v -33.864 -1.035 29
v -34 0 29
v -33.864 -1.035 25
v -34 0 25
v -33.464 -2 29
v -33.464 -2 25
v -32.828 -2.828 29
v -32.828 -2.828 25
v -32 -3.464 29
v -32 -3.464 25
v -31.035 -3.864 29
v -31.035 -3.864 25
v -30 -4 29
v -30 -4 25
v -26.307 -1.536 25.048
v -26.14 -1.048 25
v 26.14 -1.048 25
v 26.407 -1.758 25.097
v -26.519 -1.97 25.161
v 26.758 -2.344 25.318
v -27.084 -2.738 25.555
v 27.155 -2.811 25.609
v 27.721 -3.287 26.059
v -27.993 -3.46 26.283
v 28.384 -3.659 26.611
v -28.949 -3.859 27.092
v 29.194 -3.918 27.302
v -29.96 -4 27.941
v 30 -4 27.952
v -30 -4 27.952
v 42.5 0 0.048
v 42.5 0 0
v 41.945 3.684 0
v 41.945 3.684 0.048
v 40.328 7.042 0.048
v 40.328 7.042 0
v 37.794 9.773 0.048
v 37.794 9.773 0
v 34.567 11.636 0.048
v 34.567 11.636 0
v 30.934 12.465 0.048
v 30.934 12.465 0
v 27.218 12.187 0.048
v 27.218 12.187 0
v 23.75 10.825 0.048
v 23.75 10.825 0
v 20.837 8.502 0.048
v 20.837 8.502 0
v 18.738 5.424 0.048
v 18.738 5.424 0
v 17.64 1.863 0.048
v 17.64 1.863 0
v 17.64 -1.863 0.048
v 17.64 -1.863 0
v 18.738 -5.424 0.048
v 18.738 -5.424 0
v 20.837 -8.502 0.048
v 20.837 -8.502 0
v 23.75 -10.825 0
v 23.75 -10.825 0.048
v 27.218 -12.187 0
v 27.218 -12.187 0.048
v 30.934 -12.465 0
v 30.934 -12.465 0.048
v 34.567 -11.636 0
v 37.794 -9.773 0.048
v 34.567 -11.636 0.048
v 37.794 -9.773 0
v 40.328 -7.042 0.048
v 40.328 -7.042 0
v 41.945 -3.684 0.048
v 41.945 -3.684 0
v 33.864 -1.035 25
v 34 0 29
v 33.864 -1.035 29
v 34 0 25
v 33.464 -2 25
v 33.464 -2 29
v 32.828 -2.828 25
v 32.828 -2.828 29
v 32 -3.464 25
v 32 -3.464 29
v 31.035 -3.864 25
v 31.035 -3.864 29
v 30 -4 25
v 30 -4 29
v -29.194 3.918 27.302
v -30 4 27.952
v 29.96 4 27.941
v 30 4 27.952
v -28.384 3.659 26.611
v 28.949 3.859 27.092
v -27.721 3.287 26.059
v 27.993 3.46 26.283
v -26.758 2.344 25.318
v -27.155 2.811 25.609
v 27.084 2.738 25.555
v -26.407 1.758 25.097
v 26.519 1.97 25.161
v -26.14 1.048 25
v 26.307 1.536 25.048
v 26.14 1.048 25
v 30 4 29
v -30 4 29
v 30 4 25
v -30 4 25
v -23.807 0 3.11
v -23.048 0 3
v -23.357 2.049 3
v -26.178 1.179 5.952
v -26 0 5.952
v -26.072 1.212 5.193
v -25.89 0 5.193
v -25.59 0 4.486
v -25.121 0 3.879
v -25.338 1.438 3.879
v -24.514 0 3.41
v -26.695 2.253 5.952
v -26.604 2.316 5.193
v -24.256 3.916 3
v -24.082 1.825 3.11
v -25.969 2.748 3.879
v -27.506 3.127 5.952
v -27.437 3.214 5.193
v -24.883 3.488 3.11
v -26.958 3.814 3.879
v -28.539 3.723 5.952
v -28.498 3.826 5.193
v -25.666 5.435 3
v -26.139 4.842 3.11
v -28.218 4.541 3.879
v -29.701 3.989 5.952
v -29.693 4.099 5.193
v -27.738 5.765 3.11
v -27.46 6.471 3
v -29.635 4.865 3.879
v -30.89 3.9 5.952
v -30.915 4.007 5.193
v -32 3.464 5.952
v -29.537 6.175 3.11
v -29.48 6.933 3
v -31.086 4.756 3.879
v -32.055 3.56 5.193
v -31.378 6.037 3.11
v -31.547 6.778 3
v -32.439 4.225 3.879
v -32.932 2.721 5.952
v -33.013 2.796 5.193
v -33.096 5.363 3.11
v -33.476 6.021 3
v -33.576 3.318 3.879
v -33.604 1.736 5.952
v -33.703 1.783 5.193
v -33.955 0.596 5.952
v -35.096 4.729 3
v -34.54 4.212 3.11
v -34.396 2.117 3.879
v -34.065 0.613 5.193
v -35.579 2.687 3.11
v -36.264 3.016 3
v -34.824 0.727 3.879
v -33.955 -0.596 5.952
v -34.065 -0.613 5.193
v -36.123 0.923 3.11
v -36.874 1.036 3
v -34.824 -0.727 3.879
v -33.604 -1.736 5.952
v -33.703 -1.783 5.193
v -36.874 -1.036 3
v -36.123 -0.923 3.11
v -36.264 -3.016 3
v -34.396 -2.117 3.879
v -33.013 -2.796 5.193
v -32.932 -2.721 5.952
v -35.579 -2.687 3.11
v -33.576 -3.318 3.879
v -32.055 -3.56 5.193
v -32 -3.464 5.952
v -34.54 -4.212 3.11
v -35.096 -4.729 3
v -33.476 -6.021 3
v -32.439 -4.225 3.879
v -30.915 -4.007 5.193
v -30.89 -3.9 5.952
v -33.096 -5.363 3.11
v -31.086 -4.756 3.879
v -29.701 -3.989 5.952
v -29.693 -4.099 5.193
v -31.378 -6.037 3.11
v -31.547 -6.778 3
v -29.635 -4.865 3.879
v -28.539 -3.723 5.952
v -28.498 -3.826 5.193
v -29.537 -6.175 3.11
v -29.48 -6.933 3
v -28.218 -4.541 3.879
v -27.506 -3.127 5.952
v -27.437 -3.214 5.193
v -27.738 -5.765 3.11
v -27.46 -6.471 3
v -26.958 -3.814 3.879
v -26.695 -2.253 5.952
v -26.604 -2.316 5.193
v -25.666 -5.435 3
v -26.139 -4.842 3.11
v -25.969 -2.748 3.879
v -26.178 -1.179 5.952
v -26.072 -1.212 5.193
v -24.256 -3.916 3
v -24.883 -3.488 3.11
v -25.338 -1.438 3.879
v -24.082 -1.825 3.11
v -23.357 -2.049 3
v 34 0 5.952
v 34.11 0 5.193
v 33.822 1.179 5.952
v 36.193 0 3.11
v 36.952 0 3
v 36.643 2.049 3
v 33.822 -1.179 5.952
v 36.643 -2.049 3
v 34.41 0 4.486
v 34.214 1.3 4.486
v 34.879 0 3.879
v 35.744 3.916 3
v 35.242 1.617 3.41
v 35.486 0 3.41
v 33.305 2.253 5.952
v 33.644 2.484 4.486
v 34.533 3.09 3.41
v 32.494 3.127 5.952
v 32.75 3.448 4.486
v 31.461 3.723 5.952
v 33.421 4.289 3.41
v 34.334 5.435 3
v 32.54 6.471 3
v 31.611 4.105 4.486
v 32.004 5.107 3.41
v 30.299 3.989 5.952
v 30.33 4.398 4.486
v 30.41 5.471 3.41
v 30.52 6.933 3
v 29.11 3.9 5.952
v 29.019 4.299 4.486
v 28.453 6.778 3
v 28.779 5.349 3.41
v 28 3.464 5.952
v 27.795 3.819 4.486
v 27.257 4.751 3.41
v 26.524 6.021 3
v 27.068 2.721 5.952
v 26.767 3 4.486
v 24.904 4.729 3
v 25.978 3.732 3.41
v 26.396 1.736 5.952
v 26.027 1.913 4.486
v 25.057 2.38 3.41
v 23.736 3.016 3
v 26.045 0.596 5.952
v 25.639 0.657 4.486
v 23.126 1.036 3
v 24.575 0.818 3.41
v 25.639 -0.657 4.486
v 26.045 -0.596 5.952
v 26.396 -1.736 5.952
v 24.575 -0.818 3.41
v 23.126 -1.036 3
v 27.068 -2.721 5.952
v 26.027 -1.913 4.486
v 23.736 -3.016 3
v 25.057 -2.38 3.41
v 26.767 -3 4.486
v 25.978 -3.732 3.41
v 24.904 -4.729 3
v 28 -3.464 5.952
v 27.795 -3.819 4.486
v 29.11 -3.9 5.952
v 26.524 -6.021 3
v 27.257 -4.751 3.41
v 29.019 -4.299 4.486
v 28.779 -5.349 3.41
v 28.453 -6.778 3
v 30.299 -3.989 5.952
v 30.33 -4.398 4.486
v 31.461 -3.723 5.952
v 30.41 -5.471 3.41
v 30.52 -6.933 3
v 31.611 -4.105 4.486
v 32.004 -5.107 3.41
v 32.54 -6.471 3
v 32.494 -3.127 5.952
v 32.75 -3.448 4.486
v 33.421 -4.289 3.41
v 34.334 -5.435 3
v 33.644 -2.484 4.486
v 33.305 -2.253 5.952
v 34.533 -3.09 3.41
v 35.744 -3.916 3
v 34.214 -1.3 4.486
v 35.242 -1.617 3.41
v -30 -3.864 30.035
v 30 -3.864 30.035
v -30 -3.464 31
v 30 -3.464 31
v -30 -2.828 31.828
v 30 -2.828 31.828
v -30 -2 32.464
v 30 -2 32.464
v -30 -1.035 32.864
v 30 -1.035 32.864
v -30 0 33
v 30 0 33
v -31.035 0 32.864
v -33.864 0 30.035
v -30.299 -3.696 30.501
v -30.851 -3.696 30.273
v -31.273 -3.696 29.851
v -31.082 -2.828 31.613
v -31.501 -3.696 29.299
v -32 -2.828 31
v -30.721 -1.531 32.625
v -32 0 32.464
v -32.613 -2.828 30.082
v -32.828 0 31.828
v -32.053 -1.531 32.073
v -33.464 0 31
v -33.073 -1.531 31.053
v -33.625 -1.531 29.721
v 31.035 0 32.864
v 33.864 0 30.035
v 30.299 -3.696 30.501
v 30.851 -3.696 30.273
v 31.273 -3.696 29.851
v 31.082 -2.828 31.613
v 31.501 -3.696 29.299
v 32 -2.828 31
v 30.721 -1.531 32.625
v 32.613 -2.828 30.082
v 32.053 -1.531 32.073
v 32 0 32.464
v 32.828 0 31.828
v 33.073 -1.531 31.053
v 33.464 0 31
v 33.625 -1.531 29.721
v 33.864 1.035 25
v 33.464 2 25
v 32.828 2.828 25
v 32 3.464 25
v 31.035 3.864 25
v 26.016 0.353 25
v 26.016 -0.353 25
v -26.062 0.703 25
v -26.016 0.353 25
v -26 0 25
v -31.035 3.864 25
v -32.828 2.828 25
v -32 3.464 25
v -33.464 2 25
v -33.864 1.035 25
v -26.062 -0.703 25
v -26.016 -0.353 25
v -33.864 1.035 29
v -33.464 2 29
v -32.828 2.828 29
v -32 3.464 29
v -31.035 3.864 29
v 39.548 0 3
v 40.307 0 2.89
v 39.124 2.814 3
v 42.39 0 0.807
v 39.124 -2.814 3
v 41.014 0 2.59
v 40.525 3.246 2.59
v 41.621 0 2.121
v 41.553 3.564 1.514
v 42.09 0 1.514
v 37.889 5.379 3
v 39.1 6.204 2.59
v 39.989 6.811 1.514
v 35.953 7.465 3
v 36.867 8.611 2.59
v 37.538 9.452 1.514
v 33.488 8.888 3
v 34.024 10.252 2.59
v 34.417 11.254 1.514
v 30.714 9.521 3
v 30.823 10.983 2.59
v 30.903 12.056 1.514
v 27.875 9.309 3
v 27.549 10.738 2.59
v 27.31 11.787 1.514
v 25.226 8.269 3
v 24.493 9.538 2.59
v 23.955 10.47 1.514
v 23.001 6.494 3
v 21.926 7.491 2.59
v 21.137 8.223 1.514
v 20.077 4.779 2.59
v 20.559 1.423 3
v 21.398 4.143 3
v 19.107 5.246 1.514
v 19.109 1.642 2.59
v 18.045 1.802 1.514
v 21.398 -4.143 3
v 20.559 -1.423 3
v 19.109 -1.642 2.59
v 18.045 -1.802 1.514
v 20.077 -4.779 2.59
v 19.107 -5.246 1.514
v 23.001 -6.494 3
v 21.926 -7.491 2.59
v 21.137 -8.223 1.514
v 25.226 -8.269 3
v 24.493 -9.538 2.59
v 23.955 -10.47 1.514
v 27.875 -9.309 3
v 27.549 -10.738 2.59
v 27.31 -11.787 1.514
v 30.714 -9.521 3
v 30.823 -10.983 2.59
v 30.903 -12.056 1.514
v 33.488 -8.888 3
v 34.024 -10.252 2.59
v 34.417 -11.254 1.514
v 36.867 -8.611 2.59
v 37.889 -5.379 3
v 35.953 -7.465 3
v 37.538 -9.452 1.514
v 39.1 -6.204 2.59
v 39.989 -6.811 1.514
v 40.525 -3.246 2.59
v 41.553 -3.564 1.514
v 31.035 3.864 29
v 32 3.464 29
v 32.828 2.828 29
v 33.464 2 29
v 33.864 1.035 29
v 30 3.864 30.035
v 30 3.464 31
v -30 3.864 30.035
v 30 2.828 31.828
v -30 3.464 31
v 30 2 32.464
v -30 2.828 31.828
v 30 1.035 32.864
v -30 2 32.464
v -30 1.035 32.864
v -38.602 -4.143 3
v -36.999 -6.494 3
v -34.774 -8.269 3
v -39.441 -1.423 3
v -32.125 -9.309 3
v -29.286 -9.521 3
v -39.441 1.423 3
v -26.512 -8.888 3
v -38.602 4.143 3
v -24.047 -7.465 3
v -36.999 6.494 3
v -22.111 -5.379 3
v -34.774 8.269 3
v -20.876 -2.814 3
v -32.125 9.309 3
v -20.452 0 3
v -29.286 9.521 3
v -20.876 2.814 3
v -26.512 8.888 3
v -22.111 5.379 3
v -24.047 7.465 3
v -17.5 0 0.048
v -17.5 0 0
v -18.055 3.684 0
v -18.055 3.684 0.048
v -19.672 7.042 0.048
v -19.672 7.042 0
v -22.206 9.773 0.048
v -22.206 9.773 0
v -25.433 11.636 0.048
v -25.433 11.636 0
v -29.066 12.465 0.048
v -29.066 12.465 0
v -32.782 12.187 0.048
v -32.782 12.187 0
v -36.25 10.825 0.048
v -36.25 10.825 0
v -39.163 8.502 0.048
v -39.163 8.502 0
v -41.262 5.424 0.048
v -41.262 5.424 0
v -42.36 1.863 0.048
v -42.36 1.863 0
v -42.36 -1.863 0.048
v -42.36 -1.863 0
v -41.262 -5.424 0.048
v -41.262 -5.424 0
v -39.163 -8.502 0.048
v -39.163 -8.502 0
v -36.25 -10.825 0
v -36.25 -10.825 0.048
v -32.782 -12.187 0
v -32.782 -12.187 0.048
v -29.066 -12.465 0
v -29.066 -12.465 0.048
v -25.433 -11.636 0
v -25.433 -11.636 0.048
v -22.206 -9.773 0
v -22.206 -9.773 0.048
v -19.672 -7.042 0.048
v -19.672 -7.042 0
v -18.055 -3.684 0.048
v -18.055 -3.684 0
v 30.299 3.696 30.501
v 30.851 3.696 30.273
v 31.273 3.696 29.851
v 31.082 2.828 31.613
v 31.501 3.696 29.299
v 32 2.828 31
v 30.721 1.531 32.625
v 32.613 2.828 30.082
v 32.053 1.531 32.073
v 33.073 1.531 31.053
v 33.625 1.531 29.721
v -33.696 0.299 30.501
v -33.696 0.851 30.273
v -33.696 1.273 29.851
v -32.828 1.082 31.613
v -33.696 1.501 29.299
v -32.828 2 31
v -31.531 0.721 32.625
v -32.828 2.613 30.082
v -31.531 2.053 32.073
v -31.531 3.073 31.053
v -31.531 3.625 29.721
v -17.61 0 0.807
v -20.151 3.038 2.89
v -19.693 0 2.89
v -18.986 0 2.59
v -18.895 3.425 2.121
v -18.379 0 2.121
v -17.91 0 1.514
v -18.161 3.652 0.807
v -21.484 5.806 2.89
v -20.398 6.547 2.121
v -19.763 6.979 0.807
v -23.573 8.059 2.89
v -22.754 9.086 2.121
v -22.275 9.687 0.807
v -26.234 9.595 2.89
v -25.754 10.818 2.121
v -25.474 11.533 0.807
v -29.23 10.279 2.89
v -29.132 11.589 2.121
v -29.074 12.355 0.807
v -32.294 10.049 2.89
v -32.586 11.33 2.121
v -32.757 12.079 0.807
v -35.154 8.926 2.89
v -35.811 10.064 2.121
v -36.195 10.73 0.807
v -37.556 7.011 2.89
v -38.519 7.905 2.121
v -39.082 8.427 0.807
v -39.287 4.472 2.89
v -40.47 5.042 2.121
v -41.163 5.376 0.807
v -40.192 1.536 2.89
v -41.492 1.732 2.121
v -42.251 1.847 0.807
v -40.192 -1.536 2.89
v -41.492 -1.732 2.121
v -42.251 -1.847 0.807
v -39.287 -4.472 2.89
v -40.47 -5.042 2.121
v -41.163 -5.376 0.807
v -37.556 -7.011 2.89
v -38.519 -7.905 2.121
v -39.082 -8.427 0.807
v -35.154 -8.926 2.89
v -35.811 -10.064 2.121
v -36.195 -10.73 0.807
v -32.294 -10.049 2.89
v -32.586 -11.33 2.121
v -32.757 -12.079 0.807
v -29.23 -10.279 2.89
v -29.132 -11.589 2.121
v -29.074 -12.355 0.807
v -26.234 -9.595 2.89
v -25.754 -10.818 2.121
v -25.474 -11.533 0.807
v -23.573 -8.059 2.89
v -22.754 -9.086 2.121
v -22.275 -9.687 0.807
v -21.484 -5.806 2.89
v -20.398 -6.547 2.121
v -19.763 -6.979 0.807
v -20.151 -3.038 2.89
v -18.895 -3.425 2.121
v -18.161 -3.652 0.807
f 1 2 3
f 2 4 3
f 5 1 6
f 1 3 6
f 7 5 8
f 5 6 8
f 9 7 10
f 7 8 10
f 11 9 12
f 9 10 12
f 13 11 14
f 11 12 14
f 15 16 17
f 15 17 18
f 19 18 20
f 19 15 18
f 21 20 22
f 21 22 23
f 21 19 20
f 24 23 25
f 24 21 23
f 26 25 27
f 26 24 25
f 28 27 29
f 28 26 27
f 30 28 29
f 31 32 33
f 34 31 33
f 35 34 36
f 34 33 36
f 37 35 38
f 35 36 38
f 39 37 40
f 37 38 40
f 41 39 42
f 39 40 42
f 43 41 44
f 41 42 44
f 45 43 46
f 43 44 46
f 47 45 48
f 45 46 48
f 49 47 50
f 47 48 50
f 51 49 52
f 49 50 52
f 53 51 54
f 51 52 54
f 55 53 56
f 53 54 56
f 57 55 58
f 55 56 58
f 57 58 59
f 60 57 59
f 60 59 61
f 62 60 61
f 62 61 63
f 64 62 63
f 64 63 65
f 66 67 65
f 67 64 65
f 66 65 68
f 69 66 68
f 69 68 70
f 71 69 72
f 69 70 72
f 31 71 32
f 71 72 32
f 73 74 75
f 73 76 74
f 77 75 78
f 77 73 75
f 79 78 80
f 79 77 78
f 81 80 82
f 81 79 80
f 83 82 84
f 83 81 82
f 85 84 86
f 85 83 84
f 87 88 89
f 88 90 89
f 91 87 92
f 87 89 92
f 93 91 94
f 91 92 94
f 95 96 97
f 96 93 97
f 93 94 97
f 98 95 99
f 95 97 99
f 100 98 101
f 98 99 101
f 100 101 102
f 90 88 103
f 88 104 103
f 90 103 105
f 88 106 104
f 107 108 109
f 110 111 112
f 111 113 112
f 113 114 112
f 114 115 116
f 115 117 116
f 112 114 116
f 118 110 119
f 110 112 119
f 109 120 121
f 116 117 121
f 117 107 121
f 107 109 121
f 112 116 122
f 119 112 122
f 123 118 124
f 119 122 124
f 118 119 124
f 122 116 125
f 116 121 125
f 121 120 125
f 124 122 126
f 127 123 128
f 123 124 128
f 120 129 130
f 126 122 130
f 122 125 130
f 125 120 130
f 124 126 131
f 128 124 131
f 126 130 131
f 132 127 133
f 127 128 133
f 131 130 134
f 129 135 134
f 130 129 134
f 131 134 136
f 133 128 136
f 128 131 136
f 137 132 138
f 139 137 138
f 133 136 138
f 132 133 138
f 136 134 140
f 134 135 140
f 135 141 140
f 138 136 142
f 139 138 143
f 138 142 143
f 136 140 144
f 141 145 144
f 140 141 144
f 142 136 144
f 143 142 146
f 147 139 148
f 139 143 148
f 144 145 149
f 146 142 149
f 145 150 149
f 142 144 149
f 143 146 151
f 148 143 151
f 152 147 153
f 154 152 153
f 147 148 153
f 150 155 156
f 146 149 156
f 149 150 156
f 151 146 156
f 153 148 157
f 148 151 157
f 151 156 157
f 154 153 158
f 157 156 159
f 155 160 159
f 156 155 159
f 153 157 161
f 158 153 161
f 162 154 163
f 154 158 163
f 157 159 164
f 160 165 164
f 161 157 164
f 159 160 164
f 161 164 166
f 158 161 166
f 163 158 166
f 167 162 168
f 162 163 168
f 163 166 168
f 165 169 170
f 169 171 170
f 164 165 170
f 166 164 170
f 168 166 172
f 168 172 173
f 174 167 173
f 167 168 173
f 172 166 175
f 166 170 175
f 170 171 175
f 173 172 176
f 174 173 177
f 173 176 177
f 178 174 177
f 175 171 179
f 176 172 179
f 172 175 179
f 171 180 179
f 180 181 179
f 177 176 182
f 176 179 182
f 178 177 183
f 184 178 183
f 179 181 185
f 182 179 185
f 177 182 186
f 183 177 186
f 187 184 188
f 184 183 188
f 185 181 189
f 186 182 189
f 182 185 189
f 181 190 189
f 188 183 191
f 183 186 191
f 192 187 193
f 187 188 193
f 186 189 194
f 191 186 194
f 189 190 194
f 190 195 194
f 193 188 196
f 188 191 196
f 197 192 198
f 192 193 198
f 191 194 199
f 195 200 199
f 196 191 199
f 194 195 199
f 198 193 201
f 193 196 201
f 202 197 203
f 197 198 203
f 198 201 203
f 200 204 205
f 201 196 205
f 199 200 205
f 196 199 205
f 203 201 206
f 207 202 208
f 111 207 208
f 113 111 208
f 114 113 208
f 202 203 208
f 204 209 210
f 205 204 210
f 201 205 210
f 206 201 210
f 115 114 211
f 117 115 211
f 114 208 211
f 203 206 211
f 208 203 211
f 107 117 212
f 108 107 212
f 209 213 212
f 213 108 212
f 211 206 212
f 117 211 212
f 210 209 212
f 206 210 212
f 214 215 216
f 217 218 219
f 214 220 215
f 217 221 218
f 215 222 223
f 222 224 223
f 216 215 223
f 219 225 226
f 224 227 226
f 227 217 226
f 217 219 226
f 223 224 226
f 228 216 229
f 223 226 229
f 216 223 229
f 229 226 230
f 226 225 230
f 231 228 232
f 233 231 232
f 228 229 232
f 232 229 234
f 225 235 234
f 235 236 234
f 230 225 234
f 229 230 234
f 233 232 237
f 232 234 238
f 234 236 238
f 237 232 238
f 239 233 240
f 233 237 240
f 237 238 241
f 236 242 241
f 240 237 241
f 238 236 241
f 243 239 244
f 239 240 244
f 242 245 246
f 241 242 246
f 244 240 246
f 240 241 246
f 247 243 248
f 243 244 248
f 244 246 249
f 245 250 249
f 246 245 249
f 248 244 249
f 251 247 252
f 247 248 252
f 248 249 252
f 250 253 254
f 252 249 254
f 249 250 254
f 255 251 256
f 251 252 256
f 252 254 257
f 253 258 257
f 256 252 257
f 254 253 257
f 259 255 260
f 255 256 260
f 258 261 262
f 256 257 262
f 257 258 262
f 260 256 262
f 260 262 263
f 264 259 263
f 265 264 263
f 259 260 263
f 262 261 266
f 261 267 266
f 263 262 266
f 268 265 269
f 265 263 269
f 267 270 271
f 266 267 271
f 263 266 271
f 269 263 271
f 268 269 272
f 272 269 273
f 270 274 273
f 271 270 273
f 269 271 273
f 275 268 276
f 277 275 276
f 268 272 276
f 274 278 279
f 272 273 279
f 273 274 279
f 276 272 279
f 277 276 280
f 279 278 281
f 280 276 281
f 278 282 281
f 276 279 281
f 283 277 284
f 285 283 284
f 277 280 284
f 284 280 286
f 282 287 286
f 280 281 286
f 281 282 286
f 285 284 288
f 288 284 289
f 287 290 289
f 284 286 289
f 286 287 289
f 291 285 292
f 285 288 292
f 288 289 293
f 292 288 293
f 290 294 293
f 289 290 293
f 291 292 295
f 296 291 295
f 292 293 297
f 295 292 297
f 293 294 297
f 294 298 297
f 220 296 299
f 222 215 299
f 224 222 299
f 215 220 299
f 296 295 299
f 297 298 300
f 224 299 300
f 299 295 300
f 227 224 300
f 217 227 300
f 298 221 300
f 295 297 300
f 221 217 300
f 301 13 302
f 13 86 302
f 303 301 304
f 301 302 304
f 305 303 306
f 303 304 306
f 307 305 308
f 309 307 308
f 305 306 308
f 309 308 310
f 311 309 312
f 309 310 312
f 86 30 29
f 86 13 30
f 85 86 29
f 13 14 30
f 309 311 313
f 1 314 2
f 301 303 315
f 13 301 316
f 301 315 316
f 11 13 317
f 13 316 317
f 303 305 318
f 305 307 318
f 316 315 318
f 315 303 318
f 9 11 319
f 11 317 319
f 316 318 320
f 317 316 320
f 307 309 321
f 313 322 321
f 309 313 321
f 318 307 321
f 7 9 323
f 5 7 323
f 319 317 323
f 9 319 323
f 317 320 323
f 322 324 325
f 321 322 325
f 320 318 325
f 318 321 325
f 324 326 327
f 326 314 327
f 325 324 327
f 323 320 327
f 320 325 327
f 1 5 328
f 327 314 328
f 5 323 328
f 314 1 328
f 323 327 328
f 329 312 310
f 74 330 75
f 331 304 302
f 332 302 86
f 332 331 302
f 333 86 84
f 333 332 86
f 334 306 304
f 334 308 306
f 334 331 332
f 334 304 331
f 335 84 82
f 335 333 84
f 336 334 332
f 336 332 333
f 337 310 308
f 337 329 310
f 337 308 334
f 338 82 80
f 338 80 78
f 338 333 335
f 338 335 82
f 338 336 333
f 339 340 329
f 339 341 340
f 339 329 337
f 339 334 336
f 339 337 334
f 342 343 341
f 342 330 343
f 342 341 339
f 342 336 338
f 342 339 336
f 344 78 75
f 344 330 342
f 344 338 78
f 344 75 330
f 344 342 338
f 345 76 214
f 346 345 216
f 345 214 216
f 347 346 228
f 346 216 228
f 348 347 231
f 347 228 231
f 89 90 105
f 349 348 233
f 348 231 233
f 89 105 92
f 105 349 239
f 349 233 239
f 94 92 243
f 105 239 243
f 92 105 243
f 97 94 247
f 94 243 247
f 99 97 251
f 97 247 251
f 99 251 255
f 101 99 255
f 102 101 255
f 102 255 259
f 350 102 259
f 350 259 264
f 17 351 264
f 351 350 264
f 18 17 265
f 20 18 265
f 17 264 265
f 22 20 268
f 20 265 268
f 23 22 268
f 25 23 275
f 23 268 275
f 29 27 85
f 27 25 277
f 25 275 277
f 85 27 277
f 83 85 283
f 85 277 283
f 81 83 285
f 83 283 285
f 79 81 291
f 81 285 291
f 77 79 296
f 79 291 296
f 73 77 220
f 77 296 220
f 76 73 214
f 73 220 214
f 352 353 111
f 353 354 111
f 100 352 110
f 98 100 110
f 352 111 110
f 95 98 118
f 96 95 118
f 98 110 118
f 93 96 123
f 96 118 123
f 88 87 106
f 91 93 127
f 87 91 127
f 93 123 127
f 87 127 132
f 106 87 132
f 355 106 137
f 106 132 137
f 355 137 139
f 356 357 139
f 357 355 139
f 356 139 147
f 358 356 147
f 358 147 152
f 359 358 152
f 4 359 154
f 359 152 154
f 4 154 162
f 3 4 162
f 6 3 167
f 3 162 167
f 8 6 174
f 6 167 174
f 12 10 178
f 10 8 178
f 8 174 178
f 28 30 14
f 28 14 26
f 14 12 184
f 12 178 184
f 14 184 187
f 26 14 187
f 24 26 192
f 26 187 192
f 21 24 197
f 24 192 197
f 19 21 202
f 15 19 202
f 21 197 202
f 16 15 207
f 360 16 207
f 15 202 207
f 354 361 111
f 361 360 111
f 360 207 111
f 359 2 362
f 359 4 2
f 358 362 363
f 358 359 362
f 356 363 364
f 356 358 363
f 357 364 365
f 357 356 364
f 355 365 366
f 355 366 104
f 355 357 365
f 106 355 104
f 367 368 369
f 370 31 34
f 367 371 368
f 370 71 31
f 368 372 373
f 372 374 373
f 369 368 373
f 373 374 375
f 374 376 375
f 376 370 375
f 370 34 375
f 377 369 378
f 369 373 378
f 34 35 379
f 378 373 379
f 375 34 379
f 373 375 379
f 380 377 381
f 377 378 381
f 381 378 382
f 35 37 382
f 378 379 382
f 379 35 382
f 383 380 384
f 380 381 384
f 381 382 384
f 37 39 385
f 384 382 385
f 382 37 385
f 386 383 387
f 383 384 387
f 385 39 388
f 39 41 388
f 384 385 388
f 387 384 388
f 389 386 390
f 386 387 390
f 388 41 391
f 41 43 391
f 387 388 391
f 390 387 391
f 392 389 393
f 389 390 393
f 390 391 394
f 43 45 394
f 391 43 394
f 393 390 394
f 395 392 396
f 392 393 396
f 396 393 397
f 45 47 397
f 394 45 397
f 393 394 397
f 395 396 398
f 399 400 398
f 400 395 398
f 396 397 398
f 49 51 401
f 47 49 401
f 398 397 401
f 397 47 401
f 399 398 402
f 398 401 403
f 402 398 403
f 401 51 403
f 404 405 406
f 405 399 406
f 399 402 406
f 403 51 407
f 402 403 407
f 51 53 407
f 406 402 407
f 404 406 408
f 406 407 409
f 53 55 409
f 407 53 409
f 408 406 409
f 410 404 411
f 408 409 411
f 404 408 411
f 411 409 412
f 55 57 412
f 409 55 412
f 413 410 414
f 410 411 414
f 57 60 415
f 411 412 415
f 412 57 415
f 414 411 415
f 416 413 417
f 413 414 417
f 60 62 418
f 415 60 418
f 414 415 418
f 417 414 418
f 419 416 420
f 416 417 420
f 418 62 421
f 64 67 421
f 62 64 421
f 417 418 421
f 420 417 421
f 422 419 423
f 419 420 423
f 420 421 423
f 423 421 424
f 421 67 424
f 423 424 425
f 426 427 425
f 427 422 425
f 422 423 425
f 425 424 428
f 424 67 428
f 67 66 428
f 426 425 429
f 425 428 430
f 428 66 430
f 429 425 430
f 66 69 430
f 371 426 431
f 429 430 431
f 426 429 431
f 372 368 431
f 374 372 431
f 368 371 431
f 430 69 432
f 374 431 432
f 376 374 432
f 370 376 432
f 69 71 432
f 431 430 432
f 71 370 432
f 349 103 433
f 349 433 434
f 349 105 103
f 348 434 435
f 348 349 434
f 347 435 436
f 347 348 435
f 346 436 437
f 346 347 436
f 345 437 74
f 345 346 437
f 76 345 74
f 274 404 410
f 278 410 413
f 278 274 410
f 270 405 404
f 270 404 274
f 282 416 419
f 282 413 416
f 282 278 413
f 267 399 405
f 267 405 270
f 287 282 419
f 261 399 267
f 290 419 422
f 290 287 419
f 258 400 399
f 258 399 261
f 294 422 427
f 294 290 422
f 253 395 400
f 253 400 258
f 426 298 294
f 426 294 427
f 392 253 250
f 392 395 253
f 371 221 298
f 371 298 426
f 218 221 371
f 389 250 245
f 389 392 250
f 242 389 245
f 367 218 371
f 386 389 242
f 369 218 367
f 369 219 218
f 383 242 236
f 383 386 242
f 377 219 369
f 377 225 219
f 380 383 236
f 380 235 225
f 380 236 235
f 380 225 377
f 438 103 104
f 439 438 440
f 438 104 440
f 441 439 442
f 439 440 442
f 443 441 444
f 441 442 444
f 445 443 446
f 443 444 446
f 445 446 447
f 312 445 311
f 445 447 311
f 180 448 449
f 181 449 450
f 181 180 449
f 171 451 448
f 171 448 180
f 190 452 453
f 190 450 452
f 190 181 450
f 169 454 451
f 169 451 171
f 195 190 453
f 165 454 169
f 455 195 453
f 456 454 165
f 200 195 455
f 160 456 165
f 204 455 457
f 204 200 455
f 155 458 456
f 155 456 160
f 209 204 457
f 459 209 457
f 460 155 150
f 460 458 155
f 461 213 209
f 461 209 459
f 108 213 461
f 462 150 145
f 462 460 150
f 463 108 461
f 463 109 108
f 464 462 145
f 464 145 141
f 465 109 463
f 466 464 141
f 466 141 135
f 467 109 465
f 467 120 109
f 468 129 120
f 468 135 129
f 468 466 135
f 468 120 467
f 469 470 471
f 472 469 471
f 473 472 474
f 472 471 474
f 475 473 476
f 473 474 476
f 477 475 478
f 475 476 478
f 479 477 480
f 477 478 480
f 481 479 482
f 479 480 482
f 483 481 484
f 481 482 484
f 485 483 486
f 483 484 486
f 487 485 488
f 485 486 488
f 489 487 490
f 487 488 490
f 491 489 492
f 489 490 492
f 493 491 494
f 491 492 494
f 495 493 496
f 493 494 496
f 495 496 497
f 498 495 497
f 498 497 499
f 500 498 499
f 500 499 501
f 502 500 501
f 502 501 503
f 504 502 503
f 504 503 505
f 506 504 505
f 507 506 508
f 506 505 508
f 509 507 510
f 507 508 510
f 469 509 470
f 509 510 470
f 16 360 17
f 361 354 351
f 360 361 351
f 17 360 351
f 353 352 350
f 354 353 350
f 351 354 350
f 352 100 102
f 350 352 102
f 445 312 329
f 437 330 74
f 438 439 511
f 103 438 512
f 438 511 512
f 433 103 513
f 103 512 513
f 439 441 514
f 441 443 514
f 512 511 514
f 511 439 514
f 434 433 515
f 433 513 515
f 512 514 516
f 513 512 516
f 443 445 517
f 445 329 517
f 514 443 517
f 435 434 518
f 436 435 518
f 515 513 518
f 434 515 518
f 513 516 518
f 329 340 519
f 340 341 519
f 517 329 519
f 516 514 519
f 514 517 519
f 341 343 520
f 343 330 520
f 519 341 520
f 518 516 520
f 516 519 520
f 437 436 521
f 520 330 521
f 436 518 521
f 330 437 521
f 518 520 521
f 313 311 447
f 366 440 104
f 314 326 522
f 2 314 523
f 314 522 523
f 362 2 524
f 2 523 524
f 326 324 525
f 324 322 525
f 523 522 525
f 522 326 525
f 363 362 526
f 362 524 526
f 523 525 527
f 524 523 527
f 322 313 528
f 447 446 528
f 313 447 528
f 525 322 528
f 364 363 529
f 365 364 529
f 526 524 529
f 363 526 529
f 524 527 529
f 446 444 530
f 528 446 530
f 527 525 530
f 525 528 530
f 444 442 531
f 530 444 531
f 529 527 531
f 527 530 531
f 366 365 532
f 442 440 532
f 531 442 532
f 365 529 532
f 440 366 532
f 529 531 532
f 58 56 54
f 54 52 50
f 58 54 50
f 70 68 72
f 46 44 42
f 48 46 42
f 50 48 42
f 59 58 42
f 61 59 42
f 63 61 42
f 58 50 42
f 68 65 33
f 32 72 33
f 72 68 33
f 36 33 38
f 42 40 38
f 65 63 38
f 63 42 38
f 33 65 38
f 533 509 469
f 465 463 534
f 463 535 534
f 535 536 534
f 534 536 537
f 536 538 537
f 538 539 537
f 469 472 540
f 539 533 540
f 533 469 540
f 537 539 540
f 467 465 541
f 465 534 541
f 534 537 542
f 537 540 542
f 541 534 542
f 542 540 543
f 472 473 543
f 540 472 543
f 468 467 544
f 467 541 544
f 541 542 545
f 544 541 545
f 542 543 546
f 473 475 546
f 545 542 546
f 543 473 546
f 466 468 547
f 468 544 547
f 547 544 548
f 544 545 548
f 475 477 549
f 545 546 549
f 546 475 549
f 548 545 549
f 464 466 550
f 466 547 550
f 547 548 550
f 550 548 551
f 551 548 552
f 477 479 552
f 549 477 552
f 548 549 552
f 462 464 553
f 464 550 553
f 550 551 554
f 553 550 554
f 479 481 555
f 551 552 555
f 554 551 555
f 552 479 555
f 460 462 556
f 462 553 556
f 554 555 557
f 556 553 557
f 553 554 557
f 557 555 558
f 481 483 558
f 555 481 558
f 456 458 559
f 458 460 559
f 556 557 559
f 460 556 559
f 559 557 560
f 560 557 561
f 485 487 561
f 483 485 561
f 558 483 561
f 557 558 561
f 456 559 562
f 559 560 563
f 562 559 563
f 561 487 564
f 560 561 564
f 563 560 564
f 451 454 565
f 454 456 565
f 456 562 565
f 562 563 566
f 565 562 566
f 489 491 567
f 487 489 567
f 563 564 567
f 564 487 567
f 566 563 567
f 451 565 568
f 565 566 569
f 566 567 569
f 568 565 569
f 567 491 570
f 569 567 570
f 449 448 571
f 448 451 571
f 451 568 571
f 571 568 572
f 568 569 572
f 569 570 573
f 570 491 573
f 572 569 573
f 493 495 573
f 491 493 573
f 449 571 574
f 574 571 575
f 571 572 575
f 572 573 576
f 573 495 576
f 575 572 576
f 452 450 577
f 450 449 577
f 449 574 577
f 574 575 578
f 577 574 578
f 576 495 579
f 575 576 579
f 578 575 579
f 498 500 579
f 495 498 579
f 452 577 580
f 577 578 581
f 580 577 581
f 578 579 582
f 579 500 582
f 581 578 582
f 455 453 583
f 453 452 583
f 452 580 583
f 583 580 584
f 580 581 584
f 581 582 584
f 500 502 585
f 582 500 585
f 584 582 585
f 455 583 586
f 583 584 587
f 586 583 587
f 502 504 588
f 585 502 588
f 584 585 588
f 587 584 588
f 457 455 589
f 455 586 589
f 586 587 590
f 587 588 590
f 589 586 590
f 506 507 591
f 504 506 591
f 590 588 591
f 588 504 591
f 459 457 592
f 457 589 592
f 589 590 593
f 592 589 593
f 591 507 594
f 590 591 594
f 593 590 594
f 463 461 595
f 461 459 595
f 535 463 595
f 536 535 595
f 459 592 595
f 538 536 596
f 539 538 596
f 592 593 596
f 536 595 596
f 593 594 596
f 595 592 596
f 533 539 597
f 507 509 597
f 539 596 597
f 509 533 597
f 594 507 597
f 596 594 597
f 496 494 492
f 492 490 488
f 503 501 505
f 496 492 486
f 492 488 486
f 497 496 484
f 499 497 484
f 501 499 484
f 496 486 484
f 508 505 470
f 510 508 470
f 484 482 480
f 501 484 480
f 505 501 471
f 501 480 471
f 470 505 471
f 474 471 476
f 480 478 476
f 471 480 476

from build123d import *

# Parameters (mm, degrees)
F0_R         = 12.5
F1_DEPTH     = 3
F2_R         = 4
F3_DEPTH     = 30
F4_W         = 68
F4_H         = 8
F5_DEPTH     = 8
F6_R         = 3.9999
F7_T8_DEPTH  = 60
F7_S9_R      = 4
F7_T10_DEPTH = 32
F7_S11_R     = 4
F7_T12_DEPTH = 32
F7_T16_DEPTH = 60
F7_S17_R     = 4
F7_T18_DEPTH = 32
F7_S19_R     = 4
F7_T20_DEPTH = 32


# Not quite as in the source:
# - a fillet or chamfer that OpenCascade refuses, or shapes differently, is made with other operations: its cross-section is extruded or revolved along the edge and cut away or added
# - two fillets or chamfers of one size are made in one step
# - a fillet or chamfer is up to 0.001 mm smaller than in the source, because OpenCascade refuses the exact size


with BuildPart() as f1:
    # F0 (on Top) → F1 (new body)
    with BuildSketch(Plane.XY):
        with Locations((-30, 0)):
            Circle(F0_R)
    extrude(amount=F1_DEPTH)

    # F2 (on face) → F3 (join)
    with BuildSketch(Plane.XY.offset(3)):
        with Locations((-30, 0)):
            Circle(F2_R)
    extrude(amount=F3_DEPTH)



with BuildPart() as f1b:
    # F0 (on Top) → F1, piece 2 (new body)
    with BuildSketch(Plane.XY):
        with Locations((30, 0)):
            Circle(F0_R)
    extrude(amount=F1_DEPTH)

    # F2 (on face) → F3, piece 2 (join)
    with BuildSketch(Plane.XY.offset(3)):
        with Locations((30, 0)):
            Circle(F2_R)
    extrude(amount=F3_DEPTH)


with BuildPart() as f1_1:
    add(f1.part)

    add(f1b.part)  # F5 merges F1b
    # F4 (on face) → F5 (join)
    with BuildSketch(Plane.XY.offset(33)):
        Rectangle(F4_W, F4_H)
    extrude(amount=-F5_DEPTH)

    # F6 (radius 4 in the source; OpenCascade refuses exactly that, so slightly less here)
    f6_edges = [f1_1.edges().sort_by_distance(p)[0] for p in [
        (34, 0, 33),
        (0, 4, 33),
        (-34, 0, 33),
        (0, -4, 33),
        (34, -4, 29),
        (34, 4, 29),
        (-34, -4, 29),
        (-34, 4, 29),
    ]]
    fillet(f6_edges, radius=F6_R)

    # F7: fillet of radius 3 on 6 edges, made by hand

    # F7_s1 → F7_t2 (revolve)
    with BuildSketch(Plane.XZ):
        with BuildLine():
            ThreePointArc((33.9996, 6.0009656854), (34.8786796564, 3.8786796564), (37.0009656854, 2.9996))
            Line((37.0009656854, 2.9996), (37.0009656854, 2.6994634315))
            ThreePointArc((37.0009656854, 2.6994634315), (35.5004828427, 2.6998634315), (34, 2.6998634315))
            Line((34, 2.6998634315), (33.6998634315, 3))
            ThreePointArc((33.6998634315, 3), (33.6998634315, 4.5004828427), (33.6994634315, 6.0009656854))
            Line((33.6994634315, 6.0009656854), (33.9996, 6.0009656854))
        make_face()
    revolve(axis=Axis((30, 0, 3), (0, 0, 1)))

    # F7_s3 → F7_t4 (revolve)
    with BuildSketch(Plane.XZ):
        with BuildLine():
            ThreePointArc((-26.0004, 6.0009656854), (-25.1213203436, 3.8786796564), (-22.9990343146, 2.9996))
            Line((-22.9990343146, 2.9996), (-22.9990343146, 2.6994634315))
            ThreePointArc((-22.9990343146, 2.6994634315), (-24.4995171573, 2.6998634315), (-26, 2.6998634315))
            Line((-26, 2.6998634315), (-26.3001365685, 3))
            ThreePointArc((-26.3001365685, 3), (-26.3001365685, 4.5004828427), (-26.3005365685, 6.0009656854))
            Line((-26.3005365685, 6.0009656854), (-26.0004, 6.0009656854))
        make_face()
    revolve(axis=Axis((-30, 0, 3), (0, 0, 1)))


with BuildPart() as f7_tool6:
    # F7_s7 → F7_t8 (new body)
    with BuildSketch(Plane.YZ.offset(-30)):
        with BuildLine():
            ThreePointArc((-0.9990343146, 24.9996), (-3.1213203436, 25.8786796564), (-4.0004, 28.0009656854))
            Line((-4.0004, 28.0009656854), (-4.3005365685, 28.0009656854))
            ThreePointArc((-4.3005365685, 28.0009656854), (-4.3001365685, 26.5004828427), (-4.3001365685, 25))
            Line((-4.3001365685, 25), (-4, 24.6998634315))
            ThreePointArc((-4, 24.6998634315), (-2.4995171573, 24.6998634315), (-0.9990343146, 24.6994634315))
            Line((-0.9990343146, 24.6994634315), (-0.9990343146, 24.9996))
        make_face()
    extrude(amount=F7_T8_DEPTH)

    # F7_s9 → F7_t10 (cut, symmetric)
    with BuildSketch(Plane.XY.offset(26.4)):
        with Locations((30, 0)):
            Circle(F7_S9_R)
    extrude(amount=F7_T10_DEPTH, both=True, mode=Mode.SUBTRACT)

    # F7_s11 → F7_t12 (cut, symmetric)
    with BuildSketch(Plane.XY.offset(26.4)):
        with Locations((-30, 0)):
            Circle(F7_S11_R)
    extrude(amount=F7_T12_DEPTH, both=True, mode=Mode.SUBTRACT)


with BuildPart() as f1_2:
    add(f1_1.part)

    # F7_t5: cut F7_tool6
    add(f7_tool6.part, mode=Mode.SUBTRACT)


with BuildPart() as f7_tool14:
    # F7_s15 → F7_t16 (new body)
    with BuildSketch(Plane.YZ.offset(30)):
        with BuildLine():
            ThreePointArc((4.0004, 28.0009656854), (3.1213203436, 25.8786796564), (0.9990343146, 24.9996))
            Line((0.9990343146, 24.9996), (0.9990343146, 24.6994634315))
            ThreePointArc((0.9990343146, 24.6994634315), (2.4995171573, 24.6998634315), (4, 24.6998634315))
            Line((4, 24.6998634315), (4.3001365685, 25))
            ThreePointArc((4.3001365685, 25), (4.3001365685, 26.5004828427), (4.3005365685, 28.0009656854))
            Line((4.3005365685, 28.0009656854), (4.0004, 28.0009656854))
        make_face()
    extrude(amount=-F7_T16_DEPTH)

    # F7_s17 → F7_t18 (cut, symmetric)
    with BuildSketch(Plane.XY.offset(26.4)):
        with Locations((30, 0)):
            Circle(F7_S17_R)
    extrude(amount=F7_T18_DEPTH, both=True, mode=Mode.SUBTRACT)

    # F7_s19 → F7_t20 (cut, symmetric)
    with BuildSketch(Plane.XY.offset(26.4)):
        with Locations((-30, 0)):
            Circle(F7_S19_R)
    extrude(amount=F7_T20_DEPTH, both=True, mode=Mode.SUBTRACT)


with BuildPart() as f1_3:
    add(f1_2.part)

    # F7_t13: cut F7_tool14
    add(f7_tool14.part, mode=Mode.SUBTRACT)

    # F7_s21 → F7_t22 (revolve, cut)
    with BuildSketch(Plane.XZ):
        with BuildLine():
            ThreePointArc((39.4990343146, 3.0004), (41.6213203436, 2.1213203436), (42.5004, -0.0009656854))
            Line((42.5004, -0.0009656854), (42.8005365685, -0.0009656854))
            ThreePointArc((42.8005365685, -0.0009656854), (42.8001365685, 1.4995171573), (42.8001365685, 3))
            Line((42.8001365685, 3), (42.5, 3.3001365685))
            ThreePointArc((42.5, 3.3001365685), (40.9995171573, 3.3001365685), (39.4990343146, 3.3005365685))
            Line((39.4990343146, 3.3005365685), (39.4990343146, 3.0004))
        make_face()
    revolve(axis=Axis((30, 0, 3), (0, 0, 1)), mode=Mode.SUBTRACT)

    # F7_s23 → F7_t24 (revolve, cut)
    with BuildSketch(Plane.XZ):
        with BuildLine():
            ThreePointArc((-20.5009656854, 3.0004), (-18.3786796564, 2.1213203436), (-17.4996, -0.0009656854))
            Line((-17.4996, -0.0009656854), (-17.1994634315, -0.0009656854))
            ThreePointArc((-17.1994634315, -0.0009656854), (-17.1998634315, 1.4995171573), (-17.1998634315, 3))
            Line((-17.1998634315, 3), (-17.5, 3.3001365685))
            ThreePointArc((-17.5, 3.3001365685), (-19.0004828427, 3.3001365685), (-20.5009656854, 3.3005365685))
            Line((-20.5009656854, 3.3005365685), (-20.5009656854, 3.0004))
        make_face()
    revolve(axis=Axis((-30, 0, 3), (0, 0, 1)), mode=Mode.SUBTRACT)


solid = f1_3.part
